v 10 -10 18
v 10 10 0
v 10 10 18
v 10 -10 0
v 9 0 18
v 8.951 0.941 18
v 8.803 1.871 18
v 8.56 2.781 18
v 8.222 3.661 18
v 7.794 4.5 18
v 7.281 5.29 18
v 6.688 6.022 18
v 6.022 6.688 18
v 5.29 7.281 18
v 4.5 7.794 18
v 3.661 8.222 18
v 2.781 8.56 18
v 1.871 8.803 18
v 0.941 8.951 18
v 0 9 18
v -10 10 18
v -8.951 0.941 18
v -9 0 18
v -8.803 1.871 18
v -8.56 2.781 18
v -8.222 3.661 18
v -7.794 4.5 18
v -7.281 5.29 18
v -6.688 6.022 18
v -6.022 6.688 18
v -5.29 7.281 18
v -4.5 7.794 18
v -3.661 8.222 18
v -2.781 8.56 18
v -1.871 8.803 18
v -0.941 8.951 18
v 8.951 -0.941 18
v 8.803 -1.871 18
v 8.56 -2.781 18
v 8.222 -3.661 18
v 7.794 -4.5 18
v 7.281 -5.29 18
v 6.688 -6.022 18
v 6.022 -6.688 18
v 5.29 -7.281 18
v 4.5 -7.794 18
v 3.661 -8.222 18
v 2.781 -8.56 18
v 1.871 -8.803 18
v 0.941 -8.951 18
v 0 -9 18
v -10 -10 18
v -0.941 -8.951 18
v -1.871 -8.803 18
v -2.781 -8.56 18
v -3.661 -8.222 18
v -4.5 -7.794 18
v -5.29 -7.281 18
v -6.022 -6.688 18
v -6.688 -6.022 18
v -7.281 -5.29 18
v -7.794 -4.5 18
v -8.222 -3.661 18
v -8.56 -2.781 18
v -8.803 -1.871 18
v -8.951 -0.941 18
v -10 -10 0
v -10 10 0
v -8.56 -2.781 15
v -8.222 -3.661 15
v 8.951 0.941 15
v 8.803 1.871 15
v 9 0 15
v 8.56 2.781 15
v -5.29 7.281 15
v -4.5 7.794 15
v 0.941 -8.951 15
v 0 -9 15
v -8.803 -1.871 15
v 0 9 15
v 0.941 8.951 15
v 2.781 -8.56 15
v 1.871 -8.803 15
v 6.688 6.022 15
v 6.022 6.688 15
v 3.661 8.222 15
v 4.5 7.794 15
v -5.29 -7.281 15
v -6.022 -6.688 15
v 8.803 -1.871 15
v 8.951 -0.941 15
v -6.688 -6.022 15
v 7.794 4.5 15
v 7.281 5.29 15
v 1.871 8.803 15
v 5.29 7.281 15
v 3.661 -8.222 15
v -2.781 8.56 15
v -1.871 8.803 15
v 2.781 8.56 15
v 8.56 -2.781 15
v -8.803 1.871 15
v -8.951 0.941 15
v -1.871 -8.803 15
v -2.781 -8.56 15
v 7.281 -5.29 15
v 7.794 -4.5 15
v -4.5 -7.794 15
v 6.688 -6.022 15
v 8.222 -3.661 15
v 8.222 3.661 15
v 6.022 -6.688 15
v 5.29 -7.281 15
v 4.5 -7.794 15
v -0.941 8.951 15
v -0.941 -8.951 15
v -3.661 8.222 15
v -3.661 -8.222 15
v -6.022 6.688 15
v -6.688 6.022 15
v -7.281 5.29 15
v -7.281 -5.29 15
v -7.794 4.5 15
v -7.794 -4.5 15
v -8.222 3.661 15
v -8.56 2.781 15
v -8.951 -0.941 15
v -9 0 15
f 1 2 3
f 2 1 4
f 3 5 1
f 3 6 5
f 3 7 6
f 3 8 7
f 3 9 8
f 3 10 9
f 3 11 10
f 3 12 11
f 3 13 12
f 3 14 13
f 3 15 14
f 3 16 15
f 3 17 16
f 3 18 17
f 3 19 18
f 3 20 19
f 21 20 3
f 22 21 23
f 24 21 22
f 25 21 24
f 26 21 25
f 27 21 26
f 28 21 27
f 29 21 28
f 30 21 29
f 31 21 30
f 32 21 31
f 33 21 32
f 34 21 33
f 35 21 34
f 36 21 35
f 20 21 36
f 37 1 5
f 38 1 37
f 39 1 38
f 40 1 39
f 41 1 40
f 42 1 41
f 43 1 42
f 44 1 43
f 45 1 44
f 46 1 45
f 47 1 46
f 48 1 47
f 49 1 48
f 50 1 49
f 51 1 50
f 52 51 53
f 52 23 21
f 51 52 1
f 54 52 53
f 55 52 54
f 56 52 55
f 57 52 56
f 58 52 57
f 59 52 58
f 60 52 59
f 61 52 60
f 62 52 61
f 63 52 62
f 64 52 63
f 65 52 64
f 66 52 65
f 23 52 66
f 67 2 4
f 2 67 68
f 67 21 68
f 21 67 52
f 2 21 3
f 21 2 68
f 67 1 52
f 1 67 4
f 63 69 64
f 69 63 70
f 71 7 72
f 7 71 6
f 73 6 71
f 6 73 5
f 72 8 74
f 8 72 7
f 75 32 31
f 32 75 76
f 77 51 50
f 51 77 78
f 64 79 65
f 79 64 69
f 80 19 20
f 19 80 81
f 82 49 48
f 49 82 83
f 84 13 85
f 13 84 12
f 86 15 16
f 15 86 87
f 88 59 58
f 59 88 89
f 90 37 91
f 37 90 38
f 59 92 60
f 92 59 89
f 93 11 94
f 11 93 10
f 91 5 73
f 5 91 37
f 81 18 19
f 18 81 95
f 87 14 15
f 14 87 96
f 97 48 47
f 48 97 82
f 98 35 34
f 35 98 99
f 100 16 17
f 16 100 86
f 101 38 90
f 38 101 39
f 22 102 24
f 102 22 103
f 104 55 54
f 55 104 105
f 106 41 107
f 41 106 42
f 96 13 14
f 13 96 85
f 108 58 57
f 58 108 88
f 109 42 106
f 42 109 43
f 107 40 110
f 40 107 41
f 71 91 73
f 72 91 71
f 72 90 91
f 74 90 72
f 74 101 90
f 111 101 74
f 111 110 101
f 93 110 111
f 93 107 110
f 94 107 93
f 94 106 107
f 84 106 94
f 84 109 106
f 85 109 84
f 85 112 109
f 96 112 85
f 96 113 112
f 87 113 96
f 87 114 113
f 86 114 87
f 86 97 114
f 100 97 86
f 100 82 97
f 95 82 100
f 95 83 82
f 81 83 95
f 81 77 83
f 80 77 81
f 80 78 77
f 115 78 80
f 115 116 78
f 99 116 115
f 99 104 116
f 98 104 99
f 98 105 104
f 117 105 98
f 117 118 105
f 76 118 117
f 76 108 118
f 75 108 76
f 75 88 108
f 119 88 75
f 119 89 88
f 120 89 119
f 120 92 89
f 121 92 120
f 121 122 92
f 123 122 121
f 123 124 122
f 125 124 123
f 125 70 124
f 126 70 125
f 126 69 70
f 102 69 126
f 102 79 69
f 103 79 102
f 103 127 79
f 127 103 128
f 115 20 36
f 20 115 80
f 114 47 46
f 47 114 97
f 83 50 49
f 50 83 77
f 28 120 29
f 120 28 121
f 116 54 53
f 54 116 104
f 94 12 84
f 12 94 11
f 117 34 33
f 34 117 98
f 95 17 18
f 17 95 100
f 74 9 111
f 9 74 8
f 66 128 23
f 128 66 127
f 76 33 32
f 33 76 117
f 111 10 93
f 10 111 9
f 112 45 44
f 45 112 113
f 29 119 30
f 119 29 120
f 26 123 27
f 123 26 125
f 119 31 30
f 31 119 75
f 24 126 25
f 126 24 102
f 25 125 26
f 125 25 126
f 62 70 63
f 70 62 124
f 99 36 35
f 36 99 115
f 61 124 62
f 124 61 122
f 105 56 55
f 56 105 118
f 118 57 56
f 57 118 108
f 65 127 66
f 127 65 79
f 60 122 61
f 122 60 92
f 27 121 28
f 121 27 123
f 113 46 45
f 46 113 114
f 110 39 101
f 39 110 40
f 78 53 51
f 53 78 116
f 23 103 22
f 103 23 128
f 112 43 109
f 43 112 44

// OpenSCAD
include <MCAD/units.scad>

fingertipHeight = 18;
valveCapPocket = 3;

$fn=60;

module Fingertip() {
    difference() {
        translate([-10,-10,0])
        cube([20, 20, fingertipHeight]);

        translate([0, 0, fingertipHeight - valveCapPocket])
        cylinder(r=18/2, h=valveCapPocket + epsilon);
    }
}

Fingertip();
